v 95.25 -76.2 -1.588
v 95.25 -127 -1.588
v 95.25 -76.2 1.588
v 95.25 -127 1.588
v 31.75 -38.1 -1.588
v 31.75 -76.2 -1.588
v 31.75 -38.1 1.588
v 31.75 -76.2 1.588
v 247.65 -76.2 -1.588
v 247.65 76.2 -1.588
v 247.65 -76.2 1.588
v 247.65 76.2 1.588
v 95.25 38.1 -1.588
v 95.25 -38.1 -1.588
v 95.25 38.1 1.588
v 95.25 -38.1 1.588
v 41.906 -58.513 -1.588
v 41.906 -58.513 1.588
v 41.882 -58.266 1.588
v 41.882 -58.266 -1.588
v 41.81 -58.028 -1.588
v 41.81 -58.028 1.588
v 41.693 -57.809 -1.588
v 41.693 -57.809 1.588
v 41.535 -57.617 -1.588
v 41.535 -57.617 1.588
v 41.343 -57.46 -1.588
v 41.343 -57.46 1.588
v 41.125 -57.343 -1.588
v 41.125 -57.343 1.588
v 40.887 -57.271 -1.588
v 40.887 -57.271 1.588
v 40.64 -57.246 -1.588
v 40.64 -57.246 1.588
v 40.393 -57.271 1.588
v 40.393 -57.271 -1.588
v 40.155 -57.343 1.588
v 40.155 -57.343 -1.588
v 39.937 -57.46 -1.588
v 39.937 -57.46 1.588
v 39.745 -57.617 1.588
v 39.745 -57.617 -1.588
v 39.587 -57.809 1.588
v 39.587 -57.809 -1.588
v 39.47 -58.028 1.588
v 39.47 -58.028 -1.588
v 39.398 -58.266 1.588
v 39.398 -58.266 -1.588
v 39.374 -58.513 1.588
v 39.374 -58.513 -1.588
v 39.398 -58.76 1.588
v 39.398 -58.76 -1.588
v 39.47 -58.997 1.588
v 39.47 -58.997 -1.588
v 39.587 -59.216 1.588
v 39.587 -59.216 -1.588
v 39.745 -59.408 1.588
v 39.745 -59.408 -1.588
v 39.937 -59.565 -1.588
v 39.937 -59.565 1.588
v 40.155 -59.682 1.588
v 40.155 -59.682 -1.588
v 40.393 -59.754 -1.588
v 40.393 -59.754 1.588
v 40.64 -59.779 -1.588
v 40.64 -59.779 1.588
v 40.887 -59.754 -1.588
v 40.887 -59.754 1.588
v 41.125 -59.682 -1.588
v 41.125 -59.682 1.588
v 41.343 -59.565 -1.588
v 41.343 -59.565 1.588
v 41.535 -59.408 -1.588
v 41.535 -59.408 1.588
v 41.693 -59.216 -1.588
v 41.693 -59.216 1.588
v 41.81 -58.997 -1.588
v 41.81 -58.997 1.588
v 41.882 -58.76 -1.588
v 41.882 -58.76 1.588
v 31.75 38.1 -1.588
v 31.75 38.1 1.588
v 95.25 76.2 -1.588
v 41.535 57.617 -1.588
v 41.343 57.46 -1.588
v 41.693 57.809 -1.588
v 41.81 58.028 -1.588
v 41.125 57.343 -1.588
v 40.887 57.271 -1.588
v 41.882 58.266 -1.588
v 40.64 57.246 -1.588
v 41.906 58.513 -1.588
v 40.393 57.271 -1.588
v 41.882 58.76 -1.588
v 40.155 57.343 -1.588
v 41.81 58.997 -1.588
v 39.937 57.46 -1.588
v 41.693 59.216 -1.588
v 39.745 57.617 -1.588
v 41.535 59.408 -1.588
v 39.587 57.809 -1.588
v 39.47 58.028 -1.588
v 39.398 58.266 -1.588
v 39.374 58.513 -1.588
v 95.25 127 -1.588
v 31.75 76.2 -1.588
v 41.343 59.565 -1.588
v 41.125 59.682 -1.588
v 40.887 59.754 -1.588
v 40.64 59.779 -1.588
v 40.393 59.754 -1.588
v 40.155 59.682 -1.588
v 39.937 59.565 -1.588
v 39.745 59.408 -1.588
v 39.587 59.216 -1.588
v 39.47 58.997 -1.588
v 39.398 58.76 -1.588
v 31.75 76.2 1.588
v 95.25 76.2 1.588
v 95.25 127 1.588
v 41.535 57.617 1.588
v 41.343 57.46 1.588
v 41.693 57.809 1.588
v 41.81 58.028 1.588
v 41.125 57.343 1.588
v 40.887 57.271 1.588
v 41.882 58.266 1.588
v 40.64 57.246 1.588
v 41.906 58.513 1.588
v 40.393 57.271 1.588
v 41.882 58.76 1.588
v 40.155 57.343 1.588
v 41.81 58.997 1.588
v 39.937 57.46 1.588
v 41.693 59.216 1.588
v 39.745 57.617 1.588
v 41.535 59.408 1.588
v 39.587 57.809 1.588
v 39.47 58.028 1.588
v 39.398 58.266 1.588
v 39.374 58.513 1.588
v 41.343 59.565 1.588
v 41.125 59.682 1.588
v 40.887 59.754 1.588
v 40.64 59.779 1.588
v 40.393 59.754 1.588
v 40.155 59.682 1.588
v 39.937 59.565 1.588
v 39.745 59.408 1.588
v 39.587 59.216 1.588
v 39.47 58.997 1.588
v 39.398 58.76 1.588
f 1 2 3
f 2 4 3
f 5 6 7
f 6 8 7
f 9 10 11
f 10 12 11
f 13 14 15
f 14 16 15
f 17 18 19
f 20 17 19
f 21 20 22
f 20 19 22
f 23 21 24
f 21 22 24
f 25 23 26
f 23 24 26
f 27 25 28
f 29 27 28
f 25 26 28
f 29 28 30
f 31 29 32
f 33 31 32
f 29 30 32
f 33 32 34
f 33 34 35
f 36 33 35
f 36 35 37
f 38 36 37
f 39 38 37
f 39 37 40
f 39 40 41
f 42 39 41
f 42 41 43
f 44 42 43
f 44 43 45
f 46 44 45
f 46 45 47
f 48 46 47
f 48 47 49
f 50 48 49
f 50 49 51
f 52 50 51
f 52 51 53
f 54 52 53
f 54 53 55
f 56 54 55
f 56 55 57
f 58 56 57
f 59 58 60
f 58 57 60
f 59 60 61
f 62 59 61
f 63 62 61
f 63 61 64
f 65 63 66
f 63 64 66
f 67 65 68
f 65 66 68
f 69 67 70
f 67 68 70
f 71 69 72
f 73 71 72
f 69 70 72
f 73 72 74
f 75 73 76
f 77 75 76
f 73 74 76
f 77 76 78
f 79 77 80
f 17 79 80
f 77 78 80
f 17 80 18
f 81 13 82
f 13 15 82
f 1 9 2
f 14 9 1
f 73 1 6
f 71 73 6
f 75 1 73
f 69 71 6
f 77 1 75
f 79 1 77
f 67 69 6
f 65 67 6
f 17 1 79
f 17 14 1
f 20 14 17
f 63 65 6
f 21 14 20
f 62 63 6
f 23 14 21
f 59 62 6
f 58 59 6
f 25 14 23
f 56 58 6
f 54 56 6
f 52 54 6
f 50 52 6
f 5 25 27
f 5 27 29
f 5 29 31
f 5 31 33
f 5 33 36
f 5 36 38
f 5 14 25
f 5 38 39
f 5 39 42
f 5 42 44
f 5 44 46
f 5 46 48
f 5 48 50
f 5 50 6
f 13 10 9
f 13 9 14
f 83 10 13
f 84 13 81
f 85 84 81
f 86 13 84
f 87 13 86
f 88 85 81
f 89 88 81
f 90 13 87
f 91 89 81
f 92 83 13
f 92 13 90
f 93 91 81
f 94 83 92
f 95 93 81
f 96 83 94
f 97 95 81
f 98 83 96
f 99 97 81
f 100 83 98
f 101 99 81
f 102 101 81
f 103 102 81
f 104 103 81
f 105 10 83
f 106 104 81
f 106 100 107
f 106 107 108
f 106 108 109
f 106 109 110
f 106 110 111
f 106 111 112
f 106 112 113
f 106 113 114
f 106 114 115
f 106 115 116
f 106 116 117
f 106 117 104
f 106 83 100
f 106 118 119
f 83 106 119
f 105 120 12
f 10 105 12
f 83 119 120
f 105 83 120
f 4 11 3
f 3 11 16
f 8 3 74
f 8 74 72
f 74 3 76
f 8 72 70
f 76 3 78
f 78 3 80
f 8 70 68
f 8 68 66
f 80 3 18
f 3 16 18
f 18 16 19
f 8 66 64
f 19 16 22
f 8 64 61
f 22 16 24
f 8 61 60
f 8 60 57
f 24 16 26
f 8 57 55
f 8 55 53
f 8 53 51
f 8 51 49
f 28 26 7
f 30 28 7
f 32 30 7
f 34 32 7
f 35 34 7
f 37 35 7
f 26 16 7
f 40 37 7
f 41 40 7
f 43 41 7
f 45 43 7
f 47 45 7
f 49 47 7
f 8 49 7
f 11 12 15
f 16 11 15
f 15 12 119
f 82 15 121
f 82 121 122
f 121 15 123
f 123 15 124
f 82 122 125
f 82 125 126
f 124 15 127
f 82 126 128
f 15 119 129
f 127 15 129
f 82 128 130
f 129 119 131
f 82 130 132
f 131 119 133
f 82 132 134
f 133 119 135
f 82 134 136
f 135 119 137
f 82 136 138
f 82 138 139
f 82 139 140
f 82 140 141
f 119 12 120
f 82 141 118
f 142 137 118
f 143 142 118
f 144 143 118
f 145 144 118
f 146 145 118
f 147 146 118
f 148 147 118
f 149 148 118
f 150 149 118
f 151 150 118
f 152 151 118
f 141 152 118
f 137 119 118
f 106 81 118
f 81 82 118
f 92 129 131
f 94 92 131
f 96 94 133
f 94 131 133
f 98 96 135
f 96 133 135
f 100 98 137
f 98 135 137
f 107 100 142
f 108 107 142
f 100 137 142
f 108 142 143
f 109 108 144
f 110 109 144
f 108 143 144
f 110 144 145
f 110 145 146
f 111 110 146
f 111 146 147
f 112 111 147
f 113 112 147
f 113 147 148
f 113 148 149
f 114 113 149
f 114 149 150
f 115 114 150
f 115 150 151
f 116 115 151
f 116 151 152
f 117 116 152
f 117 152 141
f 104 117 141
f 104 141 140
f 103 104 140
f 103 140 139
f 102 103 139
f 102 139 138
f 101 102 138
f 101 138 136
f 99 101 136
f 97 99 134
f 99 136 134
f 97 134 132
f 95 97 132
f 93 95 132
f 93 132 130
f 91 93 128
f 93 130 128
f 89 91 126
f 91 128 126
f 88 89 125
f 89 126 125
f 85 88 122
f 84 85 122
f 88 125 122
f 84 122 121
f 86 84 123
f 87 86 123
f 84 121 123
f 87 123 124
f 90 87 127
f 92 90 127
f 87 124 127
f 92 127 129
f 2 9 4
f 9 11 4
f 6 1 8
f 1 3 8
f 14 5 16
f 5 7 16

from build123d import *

# Parameters (mm, degrees)
BOSS_EXTRUDE1_DEPTH      = 1.5875
BOSS_EXTRUDE1_DEPTH_BACK = 1.5875
SKETCH2_R                = 1.26619
CUT_EXTRUDE1_DEPTH       = 279.333618388


with BuildPart() as part:
    # Sketch1 → Boss-Extrude1 (new, two sides: drawn at the far end of the back side and taken through both)
    with BuildSketch(Plane.XY.offset(-BOSS_EXTRUDE1_DEPTH_BACK)):
        Polygon((95.25, 127), (247.65, 76.2), (247.65, -76.2), (95.25, -127), (95.25, -76.2), (31.75, -76.2), (31.75, -38.1), (95.25, -38.1), (95.25, 38.1), (31.75, 38.1), (31.75, 76.2), (95.25, 76.2), align=None)
    extrude(amount=BOSS_EXTRUDE1_DEPTH + BOSS_EXTRUDE1_DEPTH_BACK)

    # Sketch2 → Cut-Extrude1 (cut, through all)
    with BuildSketch(Plane.XY.offset(1.5875)):
        with Locations((40.64, 58.512580329)):
            Circle(SKETCH2_R)
        with Locations((40.64, -58.512580329)):
            Circle(SKETCH2_R)
    extrude(amount=-CUT_EXTRUDE1_DEPTH, mode=Mode.SUBTRACT)


solid = part.part
